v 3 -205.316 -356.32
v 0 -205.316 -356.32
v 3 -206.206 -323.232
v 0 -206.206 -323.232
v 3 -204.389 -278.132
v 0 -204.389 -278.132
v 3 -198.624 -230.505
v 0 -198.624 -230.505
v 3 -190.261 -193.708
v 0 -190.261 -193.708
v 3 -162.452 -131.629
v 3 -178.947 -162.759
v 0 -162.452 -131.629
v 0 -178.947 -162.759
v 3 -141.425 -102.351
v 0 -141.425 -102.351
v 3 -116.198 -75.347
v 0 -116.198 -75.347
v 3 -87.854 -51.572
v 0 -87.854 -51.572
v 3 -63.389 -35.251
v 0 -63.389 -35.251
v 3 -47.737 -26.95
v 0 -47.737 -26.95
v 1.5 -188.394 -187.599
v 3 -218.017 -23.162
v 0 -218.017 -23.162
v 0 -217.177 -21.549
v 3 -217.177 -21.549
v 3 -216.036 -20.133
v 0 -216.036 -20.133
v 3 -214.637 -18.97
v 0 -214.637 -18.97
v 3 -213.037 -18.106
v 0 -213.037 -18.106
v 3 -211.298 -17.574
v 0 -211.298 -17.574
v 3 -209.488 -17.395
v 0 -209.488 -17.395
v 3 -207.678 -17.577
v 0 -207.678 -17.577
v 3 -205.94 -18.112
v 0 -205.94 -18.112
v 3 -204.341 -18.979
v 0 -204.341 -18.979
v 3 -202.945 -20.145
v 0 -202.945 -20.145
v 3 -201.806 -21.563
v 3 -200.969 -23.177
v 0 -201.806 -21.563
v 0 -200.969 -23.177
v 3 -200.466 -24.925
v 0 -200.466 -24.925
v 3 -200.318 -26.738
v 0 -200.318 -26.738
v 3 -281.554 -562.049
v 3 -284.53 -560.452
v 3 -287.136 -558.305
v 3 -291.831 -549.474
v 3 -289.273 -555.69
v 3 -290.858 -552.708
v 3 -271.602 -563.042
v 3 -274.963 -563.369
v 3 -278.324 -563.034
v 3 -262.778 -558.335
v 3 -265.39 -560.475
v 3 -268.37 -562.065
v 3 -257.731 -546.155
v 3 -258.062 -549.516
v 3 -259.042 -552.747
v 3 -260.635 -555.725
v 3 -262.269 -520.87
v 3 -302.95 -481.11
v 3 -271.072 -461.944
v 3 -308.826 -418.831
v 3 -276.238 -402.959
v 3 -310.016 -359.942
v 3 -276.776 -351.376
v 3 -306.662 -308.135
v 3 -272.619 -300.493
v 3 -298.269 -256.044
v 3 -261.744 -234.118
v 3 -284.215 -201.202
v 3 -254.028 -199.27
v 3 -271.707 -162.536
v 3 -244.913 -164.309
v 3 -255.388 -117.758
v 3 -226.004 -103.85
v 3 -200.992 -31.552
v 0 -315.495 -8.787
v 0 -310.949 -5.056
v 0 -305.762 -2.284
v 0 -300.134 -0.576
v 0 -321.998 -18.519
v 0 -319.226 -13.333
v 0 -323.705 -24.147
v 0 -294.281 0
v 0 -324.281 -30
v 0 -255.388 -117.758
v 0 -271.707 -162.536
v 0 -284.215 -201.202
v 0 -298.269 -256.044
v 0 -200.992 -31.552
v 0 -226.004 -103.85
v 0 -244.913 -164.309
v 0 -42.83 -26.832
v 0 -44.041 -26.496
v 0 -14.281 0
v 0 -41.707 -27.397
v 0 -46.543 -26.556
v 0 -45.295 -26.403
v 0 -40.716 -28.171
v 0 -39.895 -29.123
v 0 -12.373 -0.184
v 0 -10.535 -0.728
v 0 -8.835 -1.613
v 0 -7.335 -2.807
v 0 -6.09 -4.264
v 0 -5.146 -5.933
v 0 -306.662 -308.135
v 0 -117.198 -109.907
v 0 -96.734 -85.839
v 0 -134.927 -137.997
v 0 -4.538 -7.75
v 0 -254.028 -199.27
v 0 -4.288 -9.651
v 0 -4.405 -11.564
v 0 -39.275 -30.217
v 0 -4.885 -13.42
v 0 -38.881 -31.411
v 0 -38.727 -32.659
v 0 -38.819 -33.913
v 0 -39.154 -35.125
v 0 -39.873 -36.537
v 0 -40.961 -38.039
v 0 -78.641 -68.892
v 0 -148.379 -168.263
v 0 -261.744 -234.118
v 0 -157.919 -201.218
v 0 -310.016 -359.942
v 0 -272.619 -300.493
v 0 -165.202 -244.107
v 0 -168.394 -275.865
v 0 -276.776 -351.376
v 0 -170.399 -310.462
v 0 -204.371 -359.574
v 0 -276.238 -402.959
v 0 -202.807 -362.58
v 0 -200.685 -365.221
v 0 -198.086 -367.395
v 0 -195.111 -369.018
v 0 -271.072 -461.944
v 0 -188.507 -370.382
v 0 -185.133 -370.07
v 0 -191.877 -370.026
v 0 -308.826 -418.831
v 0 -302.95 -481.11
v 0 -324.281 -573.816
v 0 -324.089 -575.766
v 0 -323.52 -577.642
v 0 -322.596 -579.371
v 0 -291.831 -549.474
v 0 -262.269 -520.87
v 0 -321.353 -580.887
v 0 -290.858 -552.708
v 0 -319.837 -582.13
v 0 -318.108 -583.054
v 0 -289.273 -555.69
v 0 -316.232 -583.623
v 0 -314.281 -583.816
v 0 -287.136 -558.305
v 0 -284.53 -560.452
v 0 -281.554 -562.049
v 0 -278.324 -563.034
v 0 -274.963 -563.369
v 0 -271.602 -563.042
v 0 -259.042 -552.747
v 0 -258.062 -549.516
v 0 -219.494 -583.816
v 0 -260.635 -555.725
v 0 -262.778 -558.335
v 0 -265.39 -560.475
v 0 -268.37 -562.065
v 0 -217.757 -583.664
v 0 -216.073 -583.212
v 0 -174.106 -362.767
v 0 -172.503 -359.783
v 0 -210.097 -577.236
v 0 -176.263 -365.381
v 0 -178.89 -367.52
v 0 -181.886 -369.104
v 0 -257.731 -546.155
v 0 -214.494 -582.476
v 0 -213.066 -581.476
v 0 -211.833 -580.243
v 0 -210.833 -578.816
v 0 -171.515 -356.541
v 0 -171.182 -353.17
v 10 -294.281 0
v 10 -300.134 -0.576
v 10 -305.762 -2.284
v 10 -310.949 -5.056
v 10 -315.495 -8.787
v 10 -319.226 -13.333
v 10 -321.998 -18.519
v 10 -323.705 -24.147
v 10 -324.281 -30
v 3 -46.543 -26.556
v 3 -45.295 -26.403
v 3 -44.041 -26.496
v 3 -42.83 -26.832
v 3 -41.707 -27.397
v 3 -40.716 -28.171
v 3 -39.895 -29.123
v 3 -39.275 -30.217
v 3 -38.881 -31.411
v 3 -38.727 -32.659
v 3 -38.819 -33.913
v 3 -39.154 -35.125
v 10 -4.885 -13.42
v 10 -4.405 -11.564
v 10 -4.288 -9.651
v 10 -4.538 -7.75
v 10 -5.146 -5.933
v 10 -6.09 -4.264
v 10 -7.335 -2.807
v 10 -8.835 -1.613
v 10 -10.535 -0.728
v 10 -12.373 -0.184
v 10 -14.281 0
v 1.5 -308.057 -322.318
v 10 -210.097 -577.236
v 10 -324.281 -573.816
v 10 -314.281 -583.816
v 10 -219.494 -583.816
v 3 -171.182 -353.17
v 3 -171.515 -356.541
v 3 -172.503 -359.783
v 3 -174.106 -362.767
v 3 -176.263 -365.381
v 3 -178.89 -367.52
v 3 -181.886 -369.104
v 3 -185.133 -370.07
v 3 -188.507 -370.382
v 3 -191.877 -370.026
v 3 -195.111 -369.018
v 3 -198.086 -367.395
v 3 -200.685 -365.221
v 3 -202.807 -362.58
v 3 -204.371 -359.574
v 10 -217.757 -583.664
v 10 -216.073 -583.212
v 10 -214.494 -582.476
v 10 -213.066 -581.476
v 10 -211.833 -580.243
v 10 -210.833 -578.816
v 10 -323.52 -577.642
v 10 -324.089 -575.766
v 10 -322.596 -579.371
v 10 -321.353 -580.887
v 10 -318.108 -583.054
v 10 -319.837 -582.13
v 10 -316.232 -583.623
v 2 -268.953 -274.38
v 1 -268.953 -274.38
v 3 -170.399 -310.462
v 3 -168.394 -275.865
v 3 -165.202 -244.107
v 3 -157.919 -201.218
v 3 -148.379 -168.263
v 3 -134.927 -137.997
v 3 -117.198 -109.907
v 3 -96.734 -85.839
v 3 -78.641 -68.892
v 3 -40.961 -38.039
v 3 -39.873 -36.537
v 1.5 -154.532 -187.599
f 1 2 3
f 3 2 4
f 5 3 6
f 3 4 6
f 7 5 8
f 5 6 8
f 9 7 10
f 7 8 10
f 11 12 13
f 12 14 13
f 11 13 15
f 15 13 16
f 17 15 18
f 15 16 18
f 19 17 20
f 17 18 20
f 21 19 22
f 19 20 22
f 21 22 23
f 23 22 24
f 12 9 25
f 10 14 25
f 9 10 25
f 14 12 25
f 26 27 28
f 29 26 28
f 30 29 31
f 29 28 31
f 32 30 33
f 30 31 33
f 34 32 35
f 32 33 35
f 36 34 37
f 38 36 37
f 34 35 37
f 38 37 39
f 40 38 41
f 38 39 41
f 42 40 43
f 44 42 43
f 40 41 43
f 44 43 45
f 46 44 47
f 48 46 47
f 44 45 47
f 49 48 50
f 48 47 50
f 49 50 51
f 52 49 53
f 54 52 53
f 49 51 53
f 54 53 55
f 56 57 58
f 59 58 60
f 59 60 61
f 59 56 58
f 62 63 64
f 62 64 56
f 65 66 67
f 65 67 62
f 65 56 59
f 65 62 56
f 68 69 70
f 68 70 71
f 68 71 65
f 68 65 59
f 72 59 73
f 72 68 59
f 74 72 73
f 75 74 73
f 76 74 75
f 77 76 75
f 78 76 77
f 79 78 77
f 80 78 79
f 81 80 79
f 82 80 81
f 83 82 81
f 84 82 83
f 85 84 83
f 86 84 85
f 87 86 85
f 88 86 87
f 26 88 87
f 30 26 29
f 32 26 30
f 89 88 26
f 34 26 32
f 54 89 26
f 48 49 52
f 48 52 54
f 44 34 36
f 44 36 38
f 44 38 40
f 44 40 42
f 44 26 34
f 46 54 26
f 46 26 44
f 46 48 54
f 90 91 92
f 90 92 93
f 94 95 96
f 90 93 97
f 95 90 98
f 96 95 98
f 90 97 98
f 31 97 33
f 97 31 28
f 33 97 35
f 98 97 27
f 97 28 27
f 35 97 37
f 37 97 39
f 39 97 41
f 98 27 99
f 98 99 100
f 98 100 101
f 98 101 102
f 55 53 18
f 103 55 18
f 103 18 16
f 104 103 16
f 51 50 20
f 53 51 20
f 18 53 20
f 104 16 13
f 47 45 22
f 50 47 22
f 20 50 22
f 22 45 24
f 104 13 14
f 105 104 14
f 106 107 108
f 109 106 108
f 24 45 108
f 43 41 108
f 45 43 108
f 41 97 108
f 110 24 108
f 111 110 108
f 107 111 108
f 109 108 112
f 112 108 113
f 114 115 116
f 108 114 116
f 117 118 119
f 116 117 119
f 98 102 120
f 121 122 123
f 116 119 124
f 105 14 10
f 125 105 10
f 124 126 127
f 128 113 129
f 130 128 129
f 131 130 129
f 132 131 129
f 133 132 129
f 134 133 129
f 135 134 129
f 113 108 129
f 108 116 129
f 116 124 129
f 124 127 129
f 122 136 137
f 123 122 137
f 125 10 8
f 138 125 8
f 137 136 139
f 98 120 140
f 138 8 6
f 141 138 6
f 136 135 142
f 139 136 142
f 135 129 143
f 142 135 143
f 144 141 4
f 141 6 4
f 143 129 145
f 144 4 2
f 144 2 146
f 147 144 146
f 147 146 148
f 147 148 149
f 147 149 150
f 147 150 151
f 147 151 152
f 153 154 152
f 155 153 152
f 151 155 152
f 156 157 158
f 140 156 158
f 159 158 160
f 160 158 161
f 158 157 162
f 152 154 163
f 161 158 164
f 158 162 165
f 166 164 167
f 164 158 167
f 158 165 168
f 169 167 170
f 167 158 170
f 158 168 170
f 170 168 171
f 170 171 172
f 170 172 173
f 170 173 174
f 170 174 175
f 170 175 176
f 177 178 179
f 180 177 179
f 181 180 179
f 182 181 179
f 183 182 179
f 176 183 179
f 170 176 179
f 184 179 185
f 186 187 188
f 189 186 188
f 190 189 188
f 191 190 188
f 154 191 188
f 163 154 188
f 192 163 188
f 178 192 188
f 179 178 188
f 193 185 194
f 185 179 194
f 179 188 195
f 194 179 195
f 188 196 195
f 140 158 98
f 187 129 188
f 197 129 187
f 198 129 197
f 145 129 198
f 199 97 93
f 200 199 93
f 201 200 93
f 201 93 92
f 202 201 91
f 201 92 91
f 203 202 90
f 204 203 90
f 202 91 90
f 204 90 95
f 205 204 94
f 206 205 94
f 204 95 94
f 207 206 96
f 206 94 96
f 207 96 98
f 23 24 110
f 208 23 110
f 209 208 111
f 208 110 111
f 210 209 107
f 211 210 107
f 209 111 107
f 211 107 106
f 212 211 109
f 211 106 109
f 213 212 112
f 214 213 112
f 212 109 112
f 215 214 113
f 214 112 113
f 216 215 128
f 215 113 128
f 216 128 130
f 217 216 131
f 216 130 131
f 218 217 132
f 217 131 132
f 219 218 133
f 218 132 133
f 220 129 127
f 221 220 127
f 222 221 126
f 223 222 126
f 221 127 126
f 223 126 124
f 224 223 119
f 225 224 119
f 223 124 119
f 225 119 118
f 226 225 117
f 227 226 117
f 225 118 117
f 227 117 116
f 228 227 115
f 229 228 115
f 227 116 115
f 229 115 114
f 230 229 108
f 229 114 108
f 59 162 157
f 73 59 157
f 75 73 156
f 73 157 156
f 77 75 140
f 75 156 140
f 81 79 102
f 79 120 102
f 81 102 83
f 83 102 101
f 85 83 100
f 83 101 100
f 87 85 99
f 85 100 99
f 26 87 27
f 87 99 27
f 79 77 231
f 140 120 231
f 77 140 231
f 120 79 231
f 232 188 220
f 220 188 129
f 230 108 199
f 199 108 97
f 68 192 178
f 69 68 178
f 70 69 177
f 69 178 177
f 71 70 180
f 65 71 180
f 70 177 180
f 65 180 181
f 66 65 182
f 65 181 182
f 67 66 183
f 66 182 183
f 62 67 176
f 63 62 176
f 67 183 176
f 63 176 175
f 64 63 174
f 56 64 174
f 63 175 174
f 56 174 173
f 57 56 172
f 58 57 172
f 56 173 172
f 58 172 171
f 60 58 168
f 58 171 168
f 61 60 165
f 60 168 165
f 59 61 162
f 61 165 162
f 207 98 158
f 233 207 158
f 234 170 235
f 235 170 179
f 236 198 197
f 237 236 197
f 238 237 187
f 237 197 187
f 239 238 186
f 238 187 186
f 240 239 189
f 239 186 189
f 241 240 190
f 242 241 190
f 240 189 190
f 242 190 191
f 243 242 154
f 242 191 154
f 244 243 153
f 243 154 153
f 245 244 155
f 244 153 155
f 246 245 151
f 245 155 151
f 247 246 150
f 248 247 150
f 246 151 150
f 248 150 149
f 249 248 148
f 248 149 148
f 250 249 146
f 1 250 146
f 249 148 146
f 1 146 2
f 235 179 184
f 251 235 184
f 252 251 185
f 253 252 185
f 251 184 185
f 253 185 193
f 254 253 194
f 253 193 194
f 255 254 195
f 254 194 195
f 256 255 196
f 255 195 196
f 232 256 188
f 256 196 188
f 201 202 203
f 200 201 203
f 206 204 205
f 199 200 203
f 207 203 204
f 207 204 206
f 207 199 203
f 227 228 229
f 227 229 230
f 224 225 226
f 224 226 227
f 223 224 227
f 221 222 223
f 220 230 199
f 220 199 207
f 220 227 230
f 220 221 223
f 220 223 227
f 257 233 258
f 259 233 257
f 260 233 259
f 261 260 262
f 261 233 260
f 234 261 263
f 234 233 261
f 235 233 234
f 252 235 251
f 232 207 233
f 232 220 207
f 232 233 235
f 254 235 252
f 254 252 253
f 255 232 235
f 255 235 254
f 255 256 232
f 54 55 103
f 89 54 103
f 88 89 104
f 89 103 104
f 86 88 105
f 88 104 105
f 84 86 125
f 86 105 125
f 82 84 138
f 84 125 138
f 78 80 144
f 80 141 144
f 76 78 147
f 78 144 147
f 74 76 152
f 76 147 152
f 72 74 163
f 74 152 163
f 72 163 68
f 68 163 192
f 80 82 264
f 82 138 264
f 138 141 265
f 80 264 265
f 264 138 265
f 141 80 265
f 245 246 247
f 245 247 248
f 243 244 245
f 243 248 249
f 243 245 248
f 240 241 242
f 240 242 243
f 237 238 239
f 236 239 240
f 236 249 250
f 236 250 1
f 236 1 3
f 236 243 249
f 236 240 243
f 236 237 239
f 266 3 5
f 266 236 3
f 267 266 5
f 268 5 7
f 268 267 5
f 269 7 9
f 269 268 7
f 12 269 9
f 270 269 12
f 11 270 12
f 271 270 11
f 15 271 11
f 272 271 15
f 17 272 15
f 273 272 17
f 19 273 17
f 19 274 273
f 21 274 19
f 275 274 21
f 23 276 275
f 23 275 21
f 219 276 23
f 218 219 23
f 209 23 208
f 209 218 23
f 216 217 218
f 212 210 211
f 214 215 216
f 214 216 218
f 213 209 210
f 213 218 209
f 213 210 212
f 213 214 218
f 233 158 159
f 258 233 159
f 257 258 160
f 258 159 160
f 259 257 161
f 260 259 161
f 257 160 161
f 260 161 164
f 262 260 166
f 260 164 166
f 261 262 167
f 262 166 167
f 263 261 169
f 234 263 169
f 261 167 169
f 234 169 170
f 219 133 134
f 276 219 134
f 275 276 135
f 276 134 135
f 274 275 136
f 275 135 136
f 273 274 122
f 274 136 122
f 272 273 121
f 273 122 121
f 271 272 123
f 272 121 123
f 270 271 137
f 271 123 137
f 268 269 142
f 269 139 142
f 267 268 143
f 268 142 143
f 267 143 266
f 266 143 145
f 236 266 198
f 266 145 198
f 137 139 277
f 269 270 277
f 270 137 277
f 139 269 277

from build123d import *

# Parameters (mm, degrees)
BOSS_EXTRUDE1_DEPTH = 10
CUT_EXTRUDE3_DEPTH  = 3


with BuildPart() as part:
    # Sketch1 → Boss-Extrude1 (new body)
    with BuildSketch(Plane(origin=(0, 0, 0), x_dir=(0, 0, -1), z_dir=(1, 0, 0))):
        with BuildLine():
            Line((0, -14.281480067), (0, -294.281480067))
            ThreePointArc((0, -294.281480067), (8.786796564, -315.494683503), (30, -324.281480067))
            Line((30, -324.281480067), (573.815572472, -324.281480067))
            ThreePointArc((573.815572472, -324.281480067), (580.886640283, -321.352547879), (583.815572472, -314.281480067))
            Line((583.815572472, -314.281480067), (583.815572472, -219.493566063))
            ThreePointArc((583.815572472, -219.493566063), (582.007092914, -213.757801699), (577.235773905, -210.096639855))
            Line((577.235773905, -210.096639855), (13.420201433, -4.88455386))
            ThreePointArc((13.420201433, -4.88455386), (4.264235636, -6.089959625), (0, -14.281480067))
        make_face()
    extrude(amount=BOSS_EXTRUDE1_DEPTH)

    # Sketch3 → Cut-Extrude3 (cut)
    with BuildSketch(Plane.ZY):
        with BuildLine():
            ThreePointArc((-23.162175785, -218.017297737), (-17.576945532, -207.678107035), (-26.738120061, -200.318314743))
            add(Edge.make_bspline(
                [(-26.738120061, -200.318314743), (-45.914354434, -200.660753587), (-151.32107334, -255.510398156), (-414.880335601, -286.385074175), (-542.431128002, -257.731725159), (-546.154906269, -257.731029979)],
                knots=[0, 0, 0, 0, 0.560935224, 0.660935224, 1, 1, 1, 1], degree=3))
            ThreePointArc((-546.154906269, -257.731029979), (-563.288388976, -273.27487263), (-549.474047026, -291.831036849))
            add(Edge.make_bspline(
                [(-549.474047026, -291.831036849), (-474.750080899, -306.502271197), (-284.669923623, -324.572171749), (-143.080818041, -266.034178467), (-23.162175785, -218.017297737)],
                knots=[0, 0, 0, 0, 0.423888314, 1, 1, 1, 1], degree=3))
        make_face()
        with BuildLine():
            ThreePointArc((-26.950185671, -47.737214996), (-28.17113687, -40.715672082), (-35.124917897, -39.154353359))
            add(Edge.make_bspline(
                [(-35.124917897, -39.154353359), (-50.602952828, -45.122445935), (-99.042539, -170.661871263), (-331.224003862, -171.181746235), (-353.169530365, -171.181734297)],
                knots=[0, 0, 0, 0, 0.639195597, 1, 1, 1, 1], degree=3))
            ThreePointArc((-353.169530365, -171.181734297), (-370.309371751, -186.812434708), (-356.32010769, -205.316311305))
            add(Edge.make_bspline(
                [(-356.32010769, -205.316311305), (-352.838937223, -205.964445921), (-121.396454164, -217.989087479), (-35.312726243, -66.629555086), (-26.950185671, -47.737214996)],
                knots=[0, 0, 0, 0, 0.40968467, 1, 1, 1, 1], degree=3))
        make_face()
    extrude(amount=-CUT_EXTRUDE3_DEPTH, mode=Mode.SUBTRACT)


solid = part.part
